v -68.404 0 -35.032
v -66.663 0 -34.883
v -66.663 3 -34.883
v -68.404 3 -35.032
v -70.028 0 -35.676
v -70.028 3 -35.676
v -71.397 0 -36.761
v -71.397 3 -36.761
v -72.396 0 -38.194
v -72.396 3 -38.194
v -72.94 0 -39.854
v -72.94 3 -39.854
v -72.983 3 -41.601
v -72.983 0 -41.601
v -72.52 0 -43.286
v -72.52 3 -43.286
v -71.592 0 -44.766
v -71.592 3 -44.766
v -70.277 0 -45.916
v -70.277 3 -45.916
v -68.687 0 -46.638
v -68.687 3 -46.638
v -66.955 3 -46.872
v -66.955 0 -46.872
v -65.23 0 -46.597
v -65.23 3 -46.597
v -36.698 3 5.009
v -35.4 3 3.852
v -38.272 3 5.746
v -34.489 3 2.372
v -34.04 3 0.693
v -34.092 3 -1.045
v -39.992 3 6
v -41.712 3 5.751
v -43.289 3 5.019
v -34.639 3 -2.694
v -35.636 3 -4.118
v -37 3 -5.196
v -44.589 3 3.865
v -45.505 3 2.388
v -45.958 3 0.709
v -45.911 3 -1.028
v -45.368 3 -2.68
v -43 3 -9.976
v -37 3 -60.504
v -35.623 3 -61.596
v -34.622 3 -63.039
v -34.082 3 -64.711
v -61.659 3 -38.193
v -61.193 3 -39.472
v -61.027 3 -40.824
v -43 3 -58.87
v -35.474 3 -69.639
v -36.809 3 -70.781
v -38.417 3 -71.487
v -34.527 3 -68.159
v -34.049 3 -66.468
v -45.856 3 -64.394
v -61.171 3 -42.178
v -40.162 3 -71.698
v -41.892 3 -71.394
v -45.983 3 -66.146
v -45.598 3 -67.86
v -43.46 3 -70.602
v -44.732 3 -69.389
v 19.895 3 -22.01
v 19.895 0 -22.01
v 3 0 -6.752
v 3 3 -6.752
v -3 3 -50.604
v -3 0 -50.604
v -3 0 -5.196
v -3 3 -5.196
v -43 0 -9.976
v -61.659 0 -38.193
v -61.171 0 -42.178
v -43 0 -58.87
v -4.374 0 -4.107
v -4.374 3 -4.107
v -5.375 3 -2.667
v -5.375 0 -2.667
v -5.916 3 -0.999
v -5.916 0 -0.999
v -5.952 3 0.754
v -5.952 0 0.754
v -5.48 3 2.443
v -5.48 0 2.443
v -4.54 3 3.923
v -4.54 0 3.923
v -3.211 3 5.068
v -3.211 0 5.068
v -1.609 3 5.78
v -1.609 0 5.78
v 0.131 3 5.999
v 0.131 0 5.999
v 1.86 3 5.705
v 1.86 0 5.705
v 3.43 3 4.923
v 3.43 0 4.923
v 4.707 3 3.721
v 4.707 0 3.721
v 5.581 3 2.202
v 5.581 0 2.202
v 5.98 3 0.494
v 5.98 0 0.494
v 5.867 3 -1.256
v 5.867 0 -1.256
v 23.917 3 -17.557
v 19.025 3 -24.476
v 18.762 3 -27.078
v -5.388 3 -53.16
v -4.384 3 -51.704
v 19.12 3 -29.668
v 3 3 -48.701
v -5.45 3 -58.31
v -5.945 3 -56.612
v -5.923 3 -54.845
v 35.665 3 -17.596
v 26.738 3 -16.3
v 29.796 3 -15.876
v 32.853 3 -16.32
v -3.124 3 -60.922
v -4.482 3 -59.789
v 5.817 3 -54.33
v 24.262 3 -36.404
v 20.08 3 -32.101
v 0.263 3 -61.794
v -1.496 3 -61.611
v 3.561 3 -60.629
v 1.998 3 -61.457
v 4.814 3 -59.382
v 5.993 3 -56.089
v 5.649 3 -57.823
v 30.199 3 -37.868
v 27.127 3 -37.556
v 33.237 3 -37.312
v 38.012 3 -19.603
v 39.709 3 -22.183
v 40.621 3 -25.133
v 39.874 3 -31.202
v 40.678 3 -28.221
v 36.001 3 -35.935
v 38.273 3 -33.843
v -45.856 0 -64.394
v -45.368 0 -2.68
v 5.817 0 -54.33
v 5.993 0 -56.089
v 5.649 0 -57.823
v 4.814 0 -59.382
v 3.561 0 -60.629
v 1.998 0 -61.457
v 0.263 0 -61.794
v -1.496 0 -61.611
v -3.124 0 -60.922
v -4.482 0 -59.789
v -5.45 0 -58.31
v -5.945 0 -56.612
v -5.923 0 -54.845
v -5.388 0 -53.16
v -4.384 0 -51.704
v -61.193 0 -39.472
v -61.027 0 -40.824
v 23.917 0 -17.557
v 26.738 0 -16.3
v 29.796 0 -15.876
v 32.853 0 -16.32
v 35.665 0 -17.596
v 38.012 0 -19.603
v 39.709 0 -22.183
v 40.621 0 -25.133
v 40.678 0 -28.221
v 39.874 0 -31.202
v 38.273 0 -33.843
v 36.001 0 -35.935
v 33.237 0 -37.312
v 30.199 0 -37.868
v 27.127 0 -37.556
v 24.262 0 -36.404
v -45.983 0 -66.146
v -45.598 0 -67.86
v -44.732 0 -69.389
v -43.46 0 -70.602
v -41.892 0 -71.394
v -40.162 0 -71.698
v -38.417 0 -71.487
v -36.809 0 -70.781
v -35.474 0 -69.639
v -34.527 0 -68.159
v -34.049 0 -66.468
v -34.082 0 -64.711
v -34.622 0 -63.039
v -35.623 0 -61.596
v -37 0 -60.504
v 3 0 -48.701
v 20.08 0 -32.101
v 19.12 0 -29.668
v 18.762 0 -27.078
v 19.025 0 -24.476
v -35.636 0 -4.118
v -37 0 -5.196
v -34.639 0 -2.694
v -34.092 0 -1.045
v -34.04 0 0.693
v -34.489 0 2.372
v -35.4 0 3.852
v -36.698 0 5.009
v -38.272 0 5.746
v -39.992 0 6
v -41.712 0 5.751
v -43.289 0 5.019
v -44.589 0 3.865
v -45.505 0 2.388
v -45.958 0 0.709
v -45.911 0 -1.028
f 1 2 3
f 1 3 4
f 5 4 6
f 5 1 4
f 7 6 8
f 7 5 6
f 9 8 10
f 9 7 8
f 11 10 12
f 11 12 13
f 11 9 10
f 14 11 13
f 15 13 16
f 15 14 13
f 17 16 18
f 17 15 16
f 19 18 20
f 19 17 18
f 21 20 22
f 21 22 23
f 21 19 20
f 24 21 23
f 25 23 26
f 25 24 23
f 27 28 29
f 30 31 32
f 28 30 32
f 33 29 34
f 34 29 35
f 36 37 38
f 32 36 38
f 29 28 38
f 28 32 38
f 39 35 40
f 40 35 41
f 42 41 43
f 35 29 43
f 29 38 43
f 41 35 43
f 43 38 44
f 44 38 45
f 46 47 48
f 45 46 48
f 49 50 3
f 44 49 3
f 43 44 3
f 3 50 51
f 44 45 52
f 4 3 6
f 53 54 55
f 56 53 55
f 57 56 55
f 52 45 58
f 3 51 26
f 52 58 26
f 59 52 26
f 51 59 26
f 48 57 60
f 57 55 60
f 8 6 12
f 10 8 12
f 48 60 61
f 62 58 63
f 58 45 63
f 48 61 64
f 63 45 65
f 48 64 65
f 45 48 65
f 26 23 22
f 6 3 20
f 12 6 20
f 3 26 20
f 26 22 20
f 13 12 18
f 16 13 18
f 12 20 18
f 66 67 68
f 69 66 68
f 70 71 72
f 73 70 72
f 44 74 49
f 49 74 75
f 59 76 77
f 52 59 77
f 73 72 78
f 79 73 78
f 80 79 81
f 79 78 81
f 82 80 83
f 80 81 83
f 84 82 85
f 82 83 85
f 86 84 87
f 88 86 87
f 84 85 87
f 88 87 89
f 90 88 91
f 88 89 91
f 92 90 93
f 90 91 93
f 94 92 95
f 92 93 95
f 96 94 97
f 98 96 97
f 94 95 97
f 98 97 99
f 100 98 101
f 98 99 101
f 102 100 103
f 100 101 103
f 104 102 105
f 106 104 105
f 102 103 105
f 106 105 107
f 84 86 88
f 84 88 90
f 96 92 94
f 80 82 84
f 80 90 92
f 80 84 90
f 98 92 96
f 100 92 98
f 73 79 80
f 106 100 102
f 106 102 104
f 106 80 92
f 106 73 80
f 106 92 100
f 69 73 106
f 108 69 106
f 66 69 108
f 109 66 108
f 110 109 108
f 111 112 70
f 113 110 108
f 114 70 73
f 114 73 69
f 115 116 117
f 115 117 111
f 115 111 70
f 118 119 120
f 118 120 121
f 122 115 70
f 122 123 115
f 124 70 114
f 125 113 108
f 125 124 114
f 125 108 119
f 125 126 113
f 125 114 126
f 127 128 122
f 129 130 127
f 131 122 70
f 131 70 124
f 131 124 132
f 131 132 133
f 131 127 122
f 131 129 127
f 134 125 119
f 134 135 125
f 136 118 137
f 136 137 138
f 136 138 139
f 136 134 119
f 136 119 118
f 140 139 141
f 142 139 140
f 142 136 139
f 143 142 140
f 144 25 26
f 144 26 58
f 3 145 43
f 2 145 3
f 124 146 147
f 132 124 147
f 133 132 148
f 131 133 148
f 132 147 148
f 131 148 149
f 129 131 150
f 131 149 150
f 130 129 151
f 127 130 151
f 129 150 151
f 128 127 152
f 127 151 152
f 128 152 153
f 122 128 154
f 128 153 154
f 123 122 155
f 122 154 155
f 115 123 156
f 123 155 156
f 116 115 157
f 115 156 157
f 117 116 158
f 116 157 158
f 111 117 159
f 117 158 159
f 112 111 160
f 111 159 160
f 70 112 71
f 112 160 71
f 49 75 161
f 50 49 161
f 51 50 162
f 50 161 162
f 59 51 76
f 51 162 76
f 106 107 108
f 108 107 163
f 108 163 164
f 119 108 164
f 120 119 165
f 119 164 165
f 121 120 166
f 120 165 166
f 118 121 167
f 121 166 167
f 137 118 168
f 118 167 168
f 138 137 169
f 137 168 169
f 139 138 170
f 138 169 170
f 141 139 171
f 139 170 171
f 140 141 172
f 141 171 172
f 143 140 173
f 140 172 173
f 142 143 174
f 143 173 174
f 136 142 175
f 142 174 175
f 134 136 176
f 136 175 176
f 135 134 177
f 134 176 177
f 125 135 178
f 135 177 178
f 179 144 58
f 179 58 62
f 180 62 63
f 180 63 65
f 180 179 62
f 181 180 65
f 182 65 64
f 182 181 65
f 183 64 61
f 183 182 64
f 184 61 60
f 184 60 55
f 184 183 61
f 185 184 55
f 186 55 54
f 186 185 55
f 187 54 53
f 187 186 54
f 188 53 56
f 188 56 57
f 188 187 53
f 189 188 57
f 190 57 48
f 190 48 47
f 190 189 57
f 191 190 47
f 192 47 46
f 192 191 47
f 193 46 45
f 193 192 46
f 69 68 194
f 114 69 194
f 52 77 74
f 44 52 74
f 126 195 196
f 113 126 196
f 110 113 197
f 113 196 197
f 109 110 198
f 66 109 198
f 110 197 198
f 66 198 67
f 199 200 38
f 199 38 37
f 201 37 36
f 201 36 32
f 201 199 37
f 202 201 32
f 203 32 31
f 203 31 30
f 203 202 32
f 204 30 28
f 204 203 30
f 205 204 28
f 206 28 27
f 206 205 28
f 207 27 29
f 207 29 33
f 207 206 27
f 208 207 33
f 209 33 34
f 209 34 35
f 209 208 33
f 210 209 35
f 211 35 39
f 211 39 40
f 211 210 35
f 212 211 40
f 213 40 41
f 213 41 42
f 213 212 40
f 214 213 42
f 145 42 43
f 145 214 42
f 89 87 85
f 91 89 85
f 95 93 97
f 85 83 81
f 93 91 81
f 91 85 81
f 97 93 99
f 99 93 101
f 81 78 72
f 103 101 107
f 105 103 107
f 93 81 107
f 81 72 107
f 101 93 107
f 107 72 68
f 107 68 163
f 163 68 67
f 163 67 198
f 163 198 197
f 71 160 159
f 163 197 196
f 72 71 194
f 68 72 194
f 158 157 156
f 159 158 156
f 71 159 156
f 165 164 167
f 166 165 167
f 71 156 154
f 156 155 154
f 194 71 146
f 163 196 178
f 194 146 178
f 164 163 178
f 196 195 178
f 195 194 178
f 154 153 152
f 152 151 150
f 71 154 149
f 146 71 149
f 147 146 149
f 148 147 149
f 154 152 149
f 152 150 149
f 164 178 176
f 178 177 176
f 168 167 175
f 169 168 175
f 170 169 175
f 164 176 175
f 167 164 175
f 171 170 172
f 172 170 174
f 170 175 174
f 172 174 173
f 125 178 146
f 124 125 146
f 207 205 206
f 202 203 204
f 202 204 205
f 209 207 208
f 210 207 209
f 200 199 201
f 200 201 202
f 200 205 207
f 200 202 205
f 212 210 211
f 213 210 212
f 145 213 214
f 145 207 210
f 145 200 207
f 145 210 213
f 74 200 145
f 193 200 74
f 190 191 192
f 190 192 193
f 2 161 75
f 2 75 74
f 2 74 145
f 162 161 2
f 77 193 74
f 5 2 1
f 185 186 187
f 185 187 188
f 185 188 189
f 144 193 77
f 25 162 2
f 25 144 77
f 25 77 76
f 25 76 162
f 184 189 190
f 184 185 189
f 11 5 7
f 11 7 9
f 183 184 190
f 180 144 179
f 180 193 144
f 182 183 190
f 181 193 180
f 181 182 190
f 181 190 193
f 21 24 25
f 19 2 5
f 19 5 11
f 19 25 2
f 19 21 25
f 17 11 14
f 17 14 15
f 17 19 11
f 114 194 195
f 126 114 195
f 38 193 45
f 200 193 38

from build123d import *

# Parameters (mm, degrees)
EXTRUDE_1_DEPTH   = 3
EXTRUDE_1_2_DEPTH = 3


with BuildPart() as part:
    # Эскиз1 → Бобышка-Вытянуть1 (new body)
    with BuildSketch(Plane(origin=(0, 0, 0), x_dir=(1, 0, 0), z_dir=(0, 1, 0))):
        with BuildLine():
            Line((-65.230061637, 46.596691334), (-45.856153483, 64.394064938))
            ThreePointArc((-45.856153483, 64.394064938), (-37.586941576, 71.193373193), (-37, 60.503847577))
            Line((-37, 60.503847577), (-37, 5.196152423))
            ThreePointArc((-37, 5.196152423), (-38.272069955, -5.745803491), (-45.368443052, 2.679518464))
            Line((-45.368443052, 2.679518464), (-66.663474973, 34.883178825))
            ThreePointArc((-66.663474973, 34.883178825), (-72.98273861, 41.600945273), (-65.230061637, 46.596691334))
        make_face()
        with BuildLine():
            Line((-61.171011956, 42.178081181), (-43, 58.870443195))
            Line((-43, 58.870443195), (-43, 9.975757131))
            Line((-43, 9.975757131), (-61.658722387, 38.192627654))
            ThreePointArc((-61.658722387, 38.192627654), (-61.071592268, 40.143346965), (-61.171011956, 42.178081181))
        make_face(mode=Mode.SUBTRACT)
    extrude(amount=EXTRUDE_1_DEPTH)


with BuildPart() as body_2:
    # Эскиз1 → Extrude 1 2 (new body)
    with BuildSketch(Plane(origin=(0, 0, 0), x_dir=(1, 0, 0), z_dir=(0, 1, 0))):
        with BuildLine():
            Line((-3, 50.603847577), (-3, 5.196152423))
            ThreePointArc((-3, 5.196152423), (-2.436350888, -5.483082559), (5.867027349, 1.256180752))
            Line((5.867027349, 1.256180752), (23.916758133, 17.556812348))
            ThreePointArc((23.916758133, 17.556812348), (40.75840018, 26.67494221), (24.261886225, 36.403571423))
            Line((24.261886225, 36.403571423), (5.817101981, 54.329855603))
            ThreePointArc((5.817101981, 54.329855603), (-2.335551293, 61.326771223), (-3, 50.603847577))
        make_face()
        with BuildLine():
            Line((19.895360015, 22.009716701), (3, 6.751592212))
            Line((3, 6.751592212), (3, 48.700899365))
            Line((3, 48.700899365), (20.08015284, 32.10088553))
            ThreePointArc((20.08015284, 32.10088553), (18.762088009, 27.077745962), (19.895360015, 22.009716701))
        make_face(mode=Mode.SUBTRACT)
    extrude(amount=EXTRUDE_1_2_DEPTH)


solid = Compound([part.part, body_2.part])
